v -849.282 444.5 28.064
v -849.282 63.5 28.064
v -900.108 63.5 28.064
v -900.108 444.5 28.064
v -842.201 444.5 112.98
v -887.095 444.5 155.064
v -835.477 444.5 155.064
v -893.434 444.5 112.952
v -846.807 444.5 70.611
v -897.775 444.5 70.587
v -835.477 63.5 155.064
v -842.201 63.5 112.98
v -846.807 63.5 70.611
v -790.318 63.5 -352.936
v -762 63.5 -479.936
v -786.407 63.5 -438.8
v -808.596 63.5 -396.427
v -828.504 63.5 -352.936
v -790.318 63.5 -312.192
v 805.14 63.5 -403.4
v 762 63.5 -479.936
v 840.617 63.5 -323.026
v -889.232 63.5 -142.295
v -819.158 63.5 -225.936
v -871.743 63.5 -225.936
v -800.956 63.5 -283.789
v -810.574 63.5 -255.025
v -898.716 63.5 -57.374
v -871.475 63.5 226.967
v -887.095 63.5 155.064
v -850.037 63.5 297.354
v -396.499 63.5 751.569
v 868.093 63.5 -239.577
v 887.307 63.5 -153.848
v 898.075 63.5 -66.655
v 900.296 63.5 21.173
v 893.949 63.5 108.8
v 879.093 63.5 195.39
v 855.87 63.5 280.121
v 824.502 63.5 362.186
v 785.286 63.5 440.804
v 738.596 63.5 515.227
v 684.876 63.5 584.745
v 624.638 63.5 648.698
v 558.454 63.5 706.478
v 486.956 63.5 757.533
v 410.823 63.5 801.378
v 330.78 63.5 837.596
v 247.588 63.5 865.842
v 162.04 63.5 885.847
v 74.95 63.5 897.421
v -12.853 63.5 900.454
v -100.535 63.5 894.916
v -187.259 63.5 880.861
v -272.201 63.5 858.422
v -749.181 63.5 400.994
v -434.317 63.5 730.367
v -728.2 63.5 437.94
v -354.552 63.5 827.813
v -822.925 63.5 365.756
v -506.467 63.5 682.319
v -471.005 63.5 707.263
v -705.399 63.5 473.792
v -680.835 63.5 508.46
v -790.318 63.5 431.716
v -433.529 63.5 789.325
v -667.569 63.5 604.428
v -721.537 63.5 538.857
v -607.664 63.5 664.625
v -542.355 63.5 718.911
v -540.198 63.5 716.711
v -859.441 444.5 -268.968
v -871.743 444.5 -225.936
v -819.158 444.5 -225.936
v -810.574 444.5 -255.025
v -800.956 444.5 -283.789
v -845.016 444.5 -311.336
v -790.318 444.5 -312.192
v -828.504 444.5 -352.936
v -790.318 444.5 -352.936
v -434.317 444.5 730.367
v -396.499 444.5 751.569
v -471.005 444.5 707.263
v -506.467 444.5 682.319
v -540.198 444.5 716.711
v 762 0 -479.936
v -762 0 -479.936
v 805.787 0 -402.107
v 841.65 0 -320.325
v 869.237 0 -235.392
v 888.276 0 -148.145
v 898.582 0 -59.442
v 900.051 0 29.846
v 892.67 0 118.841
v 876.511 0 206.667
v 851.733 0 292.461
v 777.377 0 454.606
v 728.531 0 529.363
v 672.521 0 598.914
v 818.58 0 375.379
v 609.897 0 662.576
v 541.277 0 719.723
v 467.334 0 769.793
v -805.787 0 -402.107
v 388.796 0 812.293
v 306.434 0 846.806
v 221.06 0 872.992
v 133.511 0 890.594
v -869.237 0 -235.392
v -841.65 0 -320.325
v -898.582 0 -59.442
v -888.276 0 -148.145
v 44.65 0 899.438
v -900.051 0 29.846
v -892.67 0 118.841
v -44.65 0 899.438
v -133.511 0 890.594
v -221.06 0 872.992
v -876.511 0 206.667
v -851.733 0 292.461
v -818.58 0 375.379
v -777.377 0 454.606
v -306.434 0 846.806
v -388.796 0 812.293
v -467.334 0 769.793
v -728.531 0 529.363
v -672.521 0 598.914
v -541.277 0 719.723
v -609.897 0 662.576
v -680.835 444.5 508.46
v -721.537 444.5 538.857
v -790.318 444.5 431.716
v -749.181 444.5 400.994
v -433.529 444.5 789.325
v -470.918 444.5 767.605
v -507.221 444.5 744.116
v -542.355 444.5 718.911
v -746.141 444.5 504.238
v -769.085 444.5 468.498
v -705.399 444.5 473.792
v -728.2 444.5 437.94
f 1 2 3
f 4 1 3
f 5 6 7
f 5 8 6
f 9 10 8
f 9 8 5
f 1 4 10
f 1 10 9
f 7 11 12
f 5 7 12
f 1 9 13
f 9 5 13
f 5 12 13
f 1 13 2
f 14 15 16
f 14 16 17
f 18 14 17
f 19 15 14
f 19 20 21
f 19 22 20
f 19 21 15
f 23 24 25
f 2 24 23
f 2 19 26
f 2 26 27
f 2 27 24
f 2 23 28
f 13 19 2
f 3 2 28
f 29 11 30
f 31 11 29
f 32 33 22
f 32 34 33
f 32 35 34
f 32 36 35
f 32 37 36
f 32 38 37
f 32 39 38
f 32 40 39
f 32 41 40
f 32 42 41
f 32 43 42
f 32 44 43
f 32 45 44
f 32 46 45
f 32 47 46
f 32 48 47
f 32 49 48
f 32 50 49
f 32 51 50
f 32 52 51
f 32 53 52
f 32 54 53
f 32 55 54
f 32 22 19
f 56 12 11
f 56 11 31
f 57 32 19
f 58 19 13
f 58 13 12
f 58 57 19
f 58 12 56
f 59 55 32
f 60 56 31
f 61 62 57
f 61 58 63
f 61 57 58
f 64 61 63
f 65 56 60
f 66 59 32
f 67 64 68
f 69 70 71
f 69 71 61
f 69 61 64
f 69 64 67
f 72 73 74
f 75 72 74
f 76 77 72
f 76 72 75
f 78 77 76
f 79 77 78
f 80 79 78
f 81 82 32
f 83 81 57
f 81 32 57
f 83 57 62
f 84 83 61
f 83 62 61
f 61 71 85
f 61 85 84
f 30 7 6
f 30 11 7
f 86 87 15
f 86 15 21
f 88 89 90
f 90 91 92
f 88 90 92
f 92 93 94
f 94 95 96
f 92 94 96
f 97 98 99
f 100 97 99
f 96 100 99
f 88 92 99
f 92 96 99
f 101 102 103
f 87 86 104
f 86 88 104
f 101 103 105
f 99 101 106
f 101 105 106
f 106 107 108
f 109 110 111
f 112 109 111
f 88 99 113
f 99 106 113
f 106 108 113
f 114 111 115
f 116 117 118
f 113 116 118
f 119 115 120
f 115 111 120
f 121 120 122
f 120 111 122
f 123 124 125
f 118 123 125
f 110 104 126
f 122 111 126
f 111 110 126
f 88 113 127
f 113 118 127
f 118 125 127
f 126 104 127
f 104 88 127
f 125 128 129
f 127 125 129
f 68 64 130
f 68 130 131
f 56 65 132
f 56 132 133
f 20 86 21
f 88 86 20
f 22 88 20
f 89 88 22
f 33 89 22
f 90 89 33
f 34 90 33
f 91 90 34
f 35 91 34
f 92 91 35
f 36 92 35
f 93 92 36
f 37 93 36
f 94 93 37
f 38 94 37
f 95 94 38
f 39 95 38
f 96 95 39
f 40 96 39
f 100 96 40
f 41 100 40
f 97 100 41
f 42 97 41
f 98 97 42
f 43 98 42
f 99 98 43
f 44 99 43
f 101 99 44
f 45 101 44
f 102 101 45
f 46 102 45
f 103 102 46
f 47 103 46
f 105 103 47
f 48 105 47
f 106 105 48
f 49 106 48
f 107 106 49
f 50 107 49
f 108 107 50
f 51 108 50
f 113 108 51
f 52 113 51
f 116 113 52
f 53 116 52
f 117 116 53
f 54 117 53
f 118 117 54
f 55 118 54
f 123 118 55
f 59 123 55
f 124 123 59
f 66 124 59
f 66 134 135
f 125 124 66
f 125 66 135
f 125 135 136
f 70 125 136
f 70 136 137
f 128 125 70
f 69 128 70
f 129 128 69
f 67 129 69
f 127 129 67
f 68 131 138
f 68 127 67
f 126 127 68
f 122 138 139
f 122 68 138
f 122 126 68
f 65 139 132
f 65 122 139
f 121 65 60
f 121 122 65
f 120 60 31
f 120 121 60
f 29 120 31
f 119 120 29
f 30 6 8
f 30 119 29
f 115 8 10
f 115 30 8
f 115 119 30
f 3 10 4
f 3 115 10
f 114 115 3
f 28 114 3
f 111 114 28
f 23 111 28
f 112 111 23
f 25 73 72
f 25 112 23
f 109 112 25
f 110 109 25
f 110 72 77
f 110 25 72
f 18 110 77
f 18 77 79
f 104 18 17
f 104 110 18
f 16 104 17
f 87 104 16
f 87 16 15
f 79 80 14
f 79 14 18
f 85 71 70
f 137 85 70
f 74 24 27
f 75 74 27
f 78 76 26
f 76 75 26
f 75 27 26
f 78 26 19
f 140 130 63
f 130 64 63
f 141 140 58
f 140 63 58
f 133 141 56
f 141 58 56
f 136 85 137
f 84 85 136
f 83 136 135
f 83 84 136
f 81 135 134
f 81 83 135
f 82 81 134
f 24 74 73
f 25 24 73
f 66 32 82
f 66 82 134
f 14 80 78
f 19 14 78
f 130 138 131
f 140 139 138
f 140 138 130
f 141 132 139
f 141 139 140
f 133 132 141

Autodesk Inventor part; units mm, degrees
ref_plane "YZ Plane" through (0, 0, 0) normal (1, 0, 0) x (0, 1, 0)
ref_plane "XZ Plane" through (0, 0, 0) normal (0, 1, 0) x (-1, 0, 0)
ref_plane "XY Plane" through (0, 0, 0) normal (0, 0, 1) x (1, 0, 0)
sketch "Sketch2" plane through (0, 0, 0) normal (0, 1, 0) x (-1, 0, 0)
  arc A0 (762, -479.9355) -> (-762, -479.9355) centre (0, 0) ccw
  line L0 (900.5455, 0) -> (762, 0)
  line L1 (762, -479.9355) -> (-762, -479.9355)
  dimension "d8" = 1524
extrude "Extrusion1" add sketch "Sketch2" along normal blind 63.5
sketch "Sketch4" plane through (0, 63.5, 0) normal (0, 1, 0) x (1, 0, 0)
  arc A0 (-762, 479.9355) -> (762, 479.9355) centre (0, 0) ccw
  line L0 (762, 479.9355) -> (-762, 479.9355) projected
  arc A1 (-762, 479.9355) -> (762, 479.9355) centre (0, 0) ccw projected
  line L1 (-762, 479.9355) -> (762, 479.9355)
  line L2 (-790.3185, 352.9355) -> (-828.5038, 352.9355)
  line L3 (-790.3185, 352.9355) -> (-790.3185, 225.9355)
  line L4 (-790.3185, 225.9355) -> (-871.7427, 225.9355)
  dimension "d15" = 127
extrude "Extrusion4" add sketch "Sketch4" along normal blind 381 contours L2 L3 L4 A0
sketch "Sketch5" plane through (0, 63.5, 0) normal (0, 1, 0) x (1, 0, 0)
  line L0 (-790.3185, 225.9355) -> (-871.7427, 225.9355) projected
  arc A0 (-762, 479.9355) -> (762, 479.9355) centre (0, 0) ccw
  arc A1 (-762, 479.9355) -> (762, 479.9355) centre (0, 0) ccw projected
  arc A2 (-871.7427, 225.9355) -> (762, 479.9355) centre (0, 0) ccw projected
  line L1 (-871.7427, 225.9355) -> (-790.3185, 225.9355) projected
  line L2 (-790.3185, 225.9355) -> (-790.3185, -28.0645)
  line L3 (-790.3185, -28.0645) -> (-900.108, -28.0645)
  line L4 (-790.3185, -28.0645) -> (-790.3185, -155.0645)
  line L5 (-790.3185, -155.0645) -> (-887.0948, -155.0645)
  line L6 (762, 479.9355) -> (-762, 479.9355) projected
  line L7 (762, 479.9355) -> (-762, 479.9355)
  dimension "d23" = 254
  dimension "d24" = 127
extrude "Extrusion6" add sketch "Sketch5" along normal blind 381 contours L4 L5 A0 L3
sketch "Sketch6" plane through (0, 63.5, 0) normal (0, 1, 0) x (1, 0, 0)
  arc A0 (-762, 479.9355) -> (762, 479.9355) centre (0, 0) ccw
  line L0 (762, 479.9355) -> (-762, 479.9355) projected
  arc A1 (-762, 479.9355) -> (762, 479.9355) centre (0, 0) ccw projected
  line L1 (-762, 479.9355) -> (762, 479.9355)
  line L2 (-790.3185, -155.0645) -> (-790.3185, -431.7161)
  arc A2 (-887.0948, -155.0645) -> (762, 479.9355) centre (0, 0) ccw projected
  line L3 (-790.3185, -431.7161) -> (-688.5633, -355.7235)
  line L4 (-688.5633, -355.7235) -> (-612.5707, -457.4787)
  line L5 (-612.5707, -457.4787) -> (-721.537, -538.8567)
  dimension "d27" = 127
  dimension "d28" = 127
  dimension "d29" = 127
  dimension "d30" = 90
  dimension "d31" = 90
extrude "Extrusion7" add sketch "Sketch6" along normal blind 381 contours L3 L4 L5 A0
sketch "Sketch7" plane through (0, 63.5, 0) normal (0, 1, 0) x (1, 0, 0)
  arc A0 (-762, 479.9355) -> (762, 479.9355) centre (0, 0) ccw
  line L0 (-762, 479.9355) -> (762, 479.9355)
  arc A1 (-721.537, -538.8567) -> (762, 479.9355) centre (0, 0) ccw projected
  line L1 (-540.1977, -716.7108) -> (-439.217, -613.7513)
  line L2 (-439.217, -613.7513) -> (-348.5473, -702.6783)
  line L3 (-348.5473, -702.6783) -> (-433.5292, -789.3254)
  line L4 (-540.1977, -716.7108) -> (-542.3554, -718.9108)
  arc A2 (-762, 479.9355) -> (762, 479.9355) centre (0, 0) ccw projected
  dimension "d34" = 254
  dimension "d35" = 127
  dimension "d36" = 90
extrude "Extrusion8" add sketch "Sketch7" along normal blind 381 contours L4 L1 L2 L3 A0
sketch "Sketch8" plane through (0, 63.5, 0) normal (0, 1, 0) x (1, 0, 0)
  arc A0 (-762, 479.9355) -> (762, 479.9355) centre (0, 0) ccw
  line L0 (762, 479.9355) -> (-762, 479.9355) projected
  line L1 (762, 479.9355) -> (-762, 479.9355)
  arc A1 (-733.4235, 429.1355) -> (733.4235, 429.1355) centre (0, 0) ccw
  line L2 (-733.4235, 429.1355) -> (733.4235, 429.1355)
  dimension "d39" = 50.8
extrude "Extrusion9" cut sketch "Sketch8" along normal blind 381 contours L2 A1
properties part number "Nest-ver2-1111-2021"
